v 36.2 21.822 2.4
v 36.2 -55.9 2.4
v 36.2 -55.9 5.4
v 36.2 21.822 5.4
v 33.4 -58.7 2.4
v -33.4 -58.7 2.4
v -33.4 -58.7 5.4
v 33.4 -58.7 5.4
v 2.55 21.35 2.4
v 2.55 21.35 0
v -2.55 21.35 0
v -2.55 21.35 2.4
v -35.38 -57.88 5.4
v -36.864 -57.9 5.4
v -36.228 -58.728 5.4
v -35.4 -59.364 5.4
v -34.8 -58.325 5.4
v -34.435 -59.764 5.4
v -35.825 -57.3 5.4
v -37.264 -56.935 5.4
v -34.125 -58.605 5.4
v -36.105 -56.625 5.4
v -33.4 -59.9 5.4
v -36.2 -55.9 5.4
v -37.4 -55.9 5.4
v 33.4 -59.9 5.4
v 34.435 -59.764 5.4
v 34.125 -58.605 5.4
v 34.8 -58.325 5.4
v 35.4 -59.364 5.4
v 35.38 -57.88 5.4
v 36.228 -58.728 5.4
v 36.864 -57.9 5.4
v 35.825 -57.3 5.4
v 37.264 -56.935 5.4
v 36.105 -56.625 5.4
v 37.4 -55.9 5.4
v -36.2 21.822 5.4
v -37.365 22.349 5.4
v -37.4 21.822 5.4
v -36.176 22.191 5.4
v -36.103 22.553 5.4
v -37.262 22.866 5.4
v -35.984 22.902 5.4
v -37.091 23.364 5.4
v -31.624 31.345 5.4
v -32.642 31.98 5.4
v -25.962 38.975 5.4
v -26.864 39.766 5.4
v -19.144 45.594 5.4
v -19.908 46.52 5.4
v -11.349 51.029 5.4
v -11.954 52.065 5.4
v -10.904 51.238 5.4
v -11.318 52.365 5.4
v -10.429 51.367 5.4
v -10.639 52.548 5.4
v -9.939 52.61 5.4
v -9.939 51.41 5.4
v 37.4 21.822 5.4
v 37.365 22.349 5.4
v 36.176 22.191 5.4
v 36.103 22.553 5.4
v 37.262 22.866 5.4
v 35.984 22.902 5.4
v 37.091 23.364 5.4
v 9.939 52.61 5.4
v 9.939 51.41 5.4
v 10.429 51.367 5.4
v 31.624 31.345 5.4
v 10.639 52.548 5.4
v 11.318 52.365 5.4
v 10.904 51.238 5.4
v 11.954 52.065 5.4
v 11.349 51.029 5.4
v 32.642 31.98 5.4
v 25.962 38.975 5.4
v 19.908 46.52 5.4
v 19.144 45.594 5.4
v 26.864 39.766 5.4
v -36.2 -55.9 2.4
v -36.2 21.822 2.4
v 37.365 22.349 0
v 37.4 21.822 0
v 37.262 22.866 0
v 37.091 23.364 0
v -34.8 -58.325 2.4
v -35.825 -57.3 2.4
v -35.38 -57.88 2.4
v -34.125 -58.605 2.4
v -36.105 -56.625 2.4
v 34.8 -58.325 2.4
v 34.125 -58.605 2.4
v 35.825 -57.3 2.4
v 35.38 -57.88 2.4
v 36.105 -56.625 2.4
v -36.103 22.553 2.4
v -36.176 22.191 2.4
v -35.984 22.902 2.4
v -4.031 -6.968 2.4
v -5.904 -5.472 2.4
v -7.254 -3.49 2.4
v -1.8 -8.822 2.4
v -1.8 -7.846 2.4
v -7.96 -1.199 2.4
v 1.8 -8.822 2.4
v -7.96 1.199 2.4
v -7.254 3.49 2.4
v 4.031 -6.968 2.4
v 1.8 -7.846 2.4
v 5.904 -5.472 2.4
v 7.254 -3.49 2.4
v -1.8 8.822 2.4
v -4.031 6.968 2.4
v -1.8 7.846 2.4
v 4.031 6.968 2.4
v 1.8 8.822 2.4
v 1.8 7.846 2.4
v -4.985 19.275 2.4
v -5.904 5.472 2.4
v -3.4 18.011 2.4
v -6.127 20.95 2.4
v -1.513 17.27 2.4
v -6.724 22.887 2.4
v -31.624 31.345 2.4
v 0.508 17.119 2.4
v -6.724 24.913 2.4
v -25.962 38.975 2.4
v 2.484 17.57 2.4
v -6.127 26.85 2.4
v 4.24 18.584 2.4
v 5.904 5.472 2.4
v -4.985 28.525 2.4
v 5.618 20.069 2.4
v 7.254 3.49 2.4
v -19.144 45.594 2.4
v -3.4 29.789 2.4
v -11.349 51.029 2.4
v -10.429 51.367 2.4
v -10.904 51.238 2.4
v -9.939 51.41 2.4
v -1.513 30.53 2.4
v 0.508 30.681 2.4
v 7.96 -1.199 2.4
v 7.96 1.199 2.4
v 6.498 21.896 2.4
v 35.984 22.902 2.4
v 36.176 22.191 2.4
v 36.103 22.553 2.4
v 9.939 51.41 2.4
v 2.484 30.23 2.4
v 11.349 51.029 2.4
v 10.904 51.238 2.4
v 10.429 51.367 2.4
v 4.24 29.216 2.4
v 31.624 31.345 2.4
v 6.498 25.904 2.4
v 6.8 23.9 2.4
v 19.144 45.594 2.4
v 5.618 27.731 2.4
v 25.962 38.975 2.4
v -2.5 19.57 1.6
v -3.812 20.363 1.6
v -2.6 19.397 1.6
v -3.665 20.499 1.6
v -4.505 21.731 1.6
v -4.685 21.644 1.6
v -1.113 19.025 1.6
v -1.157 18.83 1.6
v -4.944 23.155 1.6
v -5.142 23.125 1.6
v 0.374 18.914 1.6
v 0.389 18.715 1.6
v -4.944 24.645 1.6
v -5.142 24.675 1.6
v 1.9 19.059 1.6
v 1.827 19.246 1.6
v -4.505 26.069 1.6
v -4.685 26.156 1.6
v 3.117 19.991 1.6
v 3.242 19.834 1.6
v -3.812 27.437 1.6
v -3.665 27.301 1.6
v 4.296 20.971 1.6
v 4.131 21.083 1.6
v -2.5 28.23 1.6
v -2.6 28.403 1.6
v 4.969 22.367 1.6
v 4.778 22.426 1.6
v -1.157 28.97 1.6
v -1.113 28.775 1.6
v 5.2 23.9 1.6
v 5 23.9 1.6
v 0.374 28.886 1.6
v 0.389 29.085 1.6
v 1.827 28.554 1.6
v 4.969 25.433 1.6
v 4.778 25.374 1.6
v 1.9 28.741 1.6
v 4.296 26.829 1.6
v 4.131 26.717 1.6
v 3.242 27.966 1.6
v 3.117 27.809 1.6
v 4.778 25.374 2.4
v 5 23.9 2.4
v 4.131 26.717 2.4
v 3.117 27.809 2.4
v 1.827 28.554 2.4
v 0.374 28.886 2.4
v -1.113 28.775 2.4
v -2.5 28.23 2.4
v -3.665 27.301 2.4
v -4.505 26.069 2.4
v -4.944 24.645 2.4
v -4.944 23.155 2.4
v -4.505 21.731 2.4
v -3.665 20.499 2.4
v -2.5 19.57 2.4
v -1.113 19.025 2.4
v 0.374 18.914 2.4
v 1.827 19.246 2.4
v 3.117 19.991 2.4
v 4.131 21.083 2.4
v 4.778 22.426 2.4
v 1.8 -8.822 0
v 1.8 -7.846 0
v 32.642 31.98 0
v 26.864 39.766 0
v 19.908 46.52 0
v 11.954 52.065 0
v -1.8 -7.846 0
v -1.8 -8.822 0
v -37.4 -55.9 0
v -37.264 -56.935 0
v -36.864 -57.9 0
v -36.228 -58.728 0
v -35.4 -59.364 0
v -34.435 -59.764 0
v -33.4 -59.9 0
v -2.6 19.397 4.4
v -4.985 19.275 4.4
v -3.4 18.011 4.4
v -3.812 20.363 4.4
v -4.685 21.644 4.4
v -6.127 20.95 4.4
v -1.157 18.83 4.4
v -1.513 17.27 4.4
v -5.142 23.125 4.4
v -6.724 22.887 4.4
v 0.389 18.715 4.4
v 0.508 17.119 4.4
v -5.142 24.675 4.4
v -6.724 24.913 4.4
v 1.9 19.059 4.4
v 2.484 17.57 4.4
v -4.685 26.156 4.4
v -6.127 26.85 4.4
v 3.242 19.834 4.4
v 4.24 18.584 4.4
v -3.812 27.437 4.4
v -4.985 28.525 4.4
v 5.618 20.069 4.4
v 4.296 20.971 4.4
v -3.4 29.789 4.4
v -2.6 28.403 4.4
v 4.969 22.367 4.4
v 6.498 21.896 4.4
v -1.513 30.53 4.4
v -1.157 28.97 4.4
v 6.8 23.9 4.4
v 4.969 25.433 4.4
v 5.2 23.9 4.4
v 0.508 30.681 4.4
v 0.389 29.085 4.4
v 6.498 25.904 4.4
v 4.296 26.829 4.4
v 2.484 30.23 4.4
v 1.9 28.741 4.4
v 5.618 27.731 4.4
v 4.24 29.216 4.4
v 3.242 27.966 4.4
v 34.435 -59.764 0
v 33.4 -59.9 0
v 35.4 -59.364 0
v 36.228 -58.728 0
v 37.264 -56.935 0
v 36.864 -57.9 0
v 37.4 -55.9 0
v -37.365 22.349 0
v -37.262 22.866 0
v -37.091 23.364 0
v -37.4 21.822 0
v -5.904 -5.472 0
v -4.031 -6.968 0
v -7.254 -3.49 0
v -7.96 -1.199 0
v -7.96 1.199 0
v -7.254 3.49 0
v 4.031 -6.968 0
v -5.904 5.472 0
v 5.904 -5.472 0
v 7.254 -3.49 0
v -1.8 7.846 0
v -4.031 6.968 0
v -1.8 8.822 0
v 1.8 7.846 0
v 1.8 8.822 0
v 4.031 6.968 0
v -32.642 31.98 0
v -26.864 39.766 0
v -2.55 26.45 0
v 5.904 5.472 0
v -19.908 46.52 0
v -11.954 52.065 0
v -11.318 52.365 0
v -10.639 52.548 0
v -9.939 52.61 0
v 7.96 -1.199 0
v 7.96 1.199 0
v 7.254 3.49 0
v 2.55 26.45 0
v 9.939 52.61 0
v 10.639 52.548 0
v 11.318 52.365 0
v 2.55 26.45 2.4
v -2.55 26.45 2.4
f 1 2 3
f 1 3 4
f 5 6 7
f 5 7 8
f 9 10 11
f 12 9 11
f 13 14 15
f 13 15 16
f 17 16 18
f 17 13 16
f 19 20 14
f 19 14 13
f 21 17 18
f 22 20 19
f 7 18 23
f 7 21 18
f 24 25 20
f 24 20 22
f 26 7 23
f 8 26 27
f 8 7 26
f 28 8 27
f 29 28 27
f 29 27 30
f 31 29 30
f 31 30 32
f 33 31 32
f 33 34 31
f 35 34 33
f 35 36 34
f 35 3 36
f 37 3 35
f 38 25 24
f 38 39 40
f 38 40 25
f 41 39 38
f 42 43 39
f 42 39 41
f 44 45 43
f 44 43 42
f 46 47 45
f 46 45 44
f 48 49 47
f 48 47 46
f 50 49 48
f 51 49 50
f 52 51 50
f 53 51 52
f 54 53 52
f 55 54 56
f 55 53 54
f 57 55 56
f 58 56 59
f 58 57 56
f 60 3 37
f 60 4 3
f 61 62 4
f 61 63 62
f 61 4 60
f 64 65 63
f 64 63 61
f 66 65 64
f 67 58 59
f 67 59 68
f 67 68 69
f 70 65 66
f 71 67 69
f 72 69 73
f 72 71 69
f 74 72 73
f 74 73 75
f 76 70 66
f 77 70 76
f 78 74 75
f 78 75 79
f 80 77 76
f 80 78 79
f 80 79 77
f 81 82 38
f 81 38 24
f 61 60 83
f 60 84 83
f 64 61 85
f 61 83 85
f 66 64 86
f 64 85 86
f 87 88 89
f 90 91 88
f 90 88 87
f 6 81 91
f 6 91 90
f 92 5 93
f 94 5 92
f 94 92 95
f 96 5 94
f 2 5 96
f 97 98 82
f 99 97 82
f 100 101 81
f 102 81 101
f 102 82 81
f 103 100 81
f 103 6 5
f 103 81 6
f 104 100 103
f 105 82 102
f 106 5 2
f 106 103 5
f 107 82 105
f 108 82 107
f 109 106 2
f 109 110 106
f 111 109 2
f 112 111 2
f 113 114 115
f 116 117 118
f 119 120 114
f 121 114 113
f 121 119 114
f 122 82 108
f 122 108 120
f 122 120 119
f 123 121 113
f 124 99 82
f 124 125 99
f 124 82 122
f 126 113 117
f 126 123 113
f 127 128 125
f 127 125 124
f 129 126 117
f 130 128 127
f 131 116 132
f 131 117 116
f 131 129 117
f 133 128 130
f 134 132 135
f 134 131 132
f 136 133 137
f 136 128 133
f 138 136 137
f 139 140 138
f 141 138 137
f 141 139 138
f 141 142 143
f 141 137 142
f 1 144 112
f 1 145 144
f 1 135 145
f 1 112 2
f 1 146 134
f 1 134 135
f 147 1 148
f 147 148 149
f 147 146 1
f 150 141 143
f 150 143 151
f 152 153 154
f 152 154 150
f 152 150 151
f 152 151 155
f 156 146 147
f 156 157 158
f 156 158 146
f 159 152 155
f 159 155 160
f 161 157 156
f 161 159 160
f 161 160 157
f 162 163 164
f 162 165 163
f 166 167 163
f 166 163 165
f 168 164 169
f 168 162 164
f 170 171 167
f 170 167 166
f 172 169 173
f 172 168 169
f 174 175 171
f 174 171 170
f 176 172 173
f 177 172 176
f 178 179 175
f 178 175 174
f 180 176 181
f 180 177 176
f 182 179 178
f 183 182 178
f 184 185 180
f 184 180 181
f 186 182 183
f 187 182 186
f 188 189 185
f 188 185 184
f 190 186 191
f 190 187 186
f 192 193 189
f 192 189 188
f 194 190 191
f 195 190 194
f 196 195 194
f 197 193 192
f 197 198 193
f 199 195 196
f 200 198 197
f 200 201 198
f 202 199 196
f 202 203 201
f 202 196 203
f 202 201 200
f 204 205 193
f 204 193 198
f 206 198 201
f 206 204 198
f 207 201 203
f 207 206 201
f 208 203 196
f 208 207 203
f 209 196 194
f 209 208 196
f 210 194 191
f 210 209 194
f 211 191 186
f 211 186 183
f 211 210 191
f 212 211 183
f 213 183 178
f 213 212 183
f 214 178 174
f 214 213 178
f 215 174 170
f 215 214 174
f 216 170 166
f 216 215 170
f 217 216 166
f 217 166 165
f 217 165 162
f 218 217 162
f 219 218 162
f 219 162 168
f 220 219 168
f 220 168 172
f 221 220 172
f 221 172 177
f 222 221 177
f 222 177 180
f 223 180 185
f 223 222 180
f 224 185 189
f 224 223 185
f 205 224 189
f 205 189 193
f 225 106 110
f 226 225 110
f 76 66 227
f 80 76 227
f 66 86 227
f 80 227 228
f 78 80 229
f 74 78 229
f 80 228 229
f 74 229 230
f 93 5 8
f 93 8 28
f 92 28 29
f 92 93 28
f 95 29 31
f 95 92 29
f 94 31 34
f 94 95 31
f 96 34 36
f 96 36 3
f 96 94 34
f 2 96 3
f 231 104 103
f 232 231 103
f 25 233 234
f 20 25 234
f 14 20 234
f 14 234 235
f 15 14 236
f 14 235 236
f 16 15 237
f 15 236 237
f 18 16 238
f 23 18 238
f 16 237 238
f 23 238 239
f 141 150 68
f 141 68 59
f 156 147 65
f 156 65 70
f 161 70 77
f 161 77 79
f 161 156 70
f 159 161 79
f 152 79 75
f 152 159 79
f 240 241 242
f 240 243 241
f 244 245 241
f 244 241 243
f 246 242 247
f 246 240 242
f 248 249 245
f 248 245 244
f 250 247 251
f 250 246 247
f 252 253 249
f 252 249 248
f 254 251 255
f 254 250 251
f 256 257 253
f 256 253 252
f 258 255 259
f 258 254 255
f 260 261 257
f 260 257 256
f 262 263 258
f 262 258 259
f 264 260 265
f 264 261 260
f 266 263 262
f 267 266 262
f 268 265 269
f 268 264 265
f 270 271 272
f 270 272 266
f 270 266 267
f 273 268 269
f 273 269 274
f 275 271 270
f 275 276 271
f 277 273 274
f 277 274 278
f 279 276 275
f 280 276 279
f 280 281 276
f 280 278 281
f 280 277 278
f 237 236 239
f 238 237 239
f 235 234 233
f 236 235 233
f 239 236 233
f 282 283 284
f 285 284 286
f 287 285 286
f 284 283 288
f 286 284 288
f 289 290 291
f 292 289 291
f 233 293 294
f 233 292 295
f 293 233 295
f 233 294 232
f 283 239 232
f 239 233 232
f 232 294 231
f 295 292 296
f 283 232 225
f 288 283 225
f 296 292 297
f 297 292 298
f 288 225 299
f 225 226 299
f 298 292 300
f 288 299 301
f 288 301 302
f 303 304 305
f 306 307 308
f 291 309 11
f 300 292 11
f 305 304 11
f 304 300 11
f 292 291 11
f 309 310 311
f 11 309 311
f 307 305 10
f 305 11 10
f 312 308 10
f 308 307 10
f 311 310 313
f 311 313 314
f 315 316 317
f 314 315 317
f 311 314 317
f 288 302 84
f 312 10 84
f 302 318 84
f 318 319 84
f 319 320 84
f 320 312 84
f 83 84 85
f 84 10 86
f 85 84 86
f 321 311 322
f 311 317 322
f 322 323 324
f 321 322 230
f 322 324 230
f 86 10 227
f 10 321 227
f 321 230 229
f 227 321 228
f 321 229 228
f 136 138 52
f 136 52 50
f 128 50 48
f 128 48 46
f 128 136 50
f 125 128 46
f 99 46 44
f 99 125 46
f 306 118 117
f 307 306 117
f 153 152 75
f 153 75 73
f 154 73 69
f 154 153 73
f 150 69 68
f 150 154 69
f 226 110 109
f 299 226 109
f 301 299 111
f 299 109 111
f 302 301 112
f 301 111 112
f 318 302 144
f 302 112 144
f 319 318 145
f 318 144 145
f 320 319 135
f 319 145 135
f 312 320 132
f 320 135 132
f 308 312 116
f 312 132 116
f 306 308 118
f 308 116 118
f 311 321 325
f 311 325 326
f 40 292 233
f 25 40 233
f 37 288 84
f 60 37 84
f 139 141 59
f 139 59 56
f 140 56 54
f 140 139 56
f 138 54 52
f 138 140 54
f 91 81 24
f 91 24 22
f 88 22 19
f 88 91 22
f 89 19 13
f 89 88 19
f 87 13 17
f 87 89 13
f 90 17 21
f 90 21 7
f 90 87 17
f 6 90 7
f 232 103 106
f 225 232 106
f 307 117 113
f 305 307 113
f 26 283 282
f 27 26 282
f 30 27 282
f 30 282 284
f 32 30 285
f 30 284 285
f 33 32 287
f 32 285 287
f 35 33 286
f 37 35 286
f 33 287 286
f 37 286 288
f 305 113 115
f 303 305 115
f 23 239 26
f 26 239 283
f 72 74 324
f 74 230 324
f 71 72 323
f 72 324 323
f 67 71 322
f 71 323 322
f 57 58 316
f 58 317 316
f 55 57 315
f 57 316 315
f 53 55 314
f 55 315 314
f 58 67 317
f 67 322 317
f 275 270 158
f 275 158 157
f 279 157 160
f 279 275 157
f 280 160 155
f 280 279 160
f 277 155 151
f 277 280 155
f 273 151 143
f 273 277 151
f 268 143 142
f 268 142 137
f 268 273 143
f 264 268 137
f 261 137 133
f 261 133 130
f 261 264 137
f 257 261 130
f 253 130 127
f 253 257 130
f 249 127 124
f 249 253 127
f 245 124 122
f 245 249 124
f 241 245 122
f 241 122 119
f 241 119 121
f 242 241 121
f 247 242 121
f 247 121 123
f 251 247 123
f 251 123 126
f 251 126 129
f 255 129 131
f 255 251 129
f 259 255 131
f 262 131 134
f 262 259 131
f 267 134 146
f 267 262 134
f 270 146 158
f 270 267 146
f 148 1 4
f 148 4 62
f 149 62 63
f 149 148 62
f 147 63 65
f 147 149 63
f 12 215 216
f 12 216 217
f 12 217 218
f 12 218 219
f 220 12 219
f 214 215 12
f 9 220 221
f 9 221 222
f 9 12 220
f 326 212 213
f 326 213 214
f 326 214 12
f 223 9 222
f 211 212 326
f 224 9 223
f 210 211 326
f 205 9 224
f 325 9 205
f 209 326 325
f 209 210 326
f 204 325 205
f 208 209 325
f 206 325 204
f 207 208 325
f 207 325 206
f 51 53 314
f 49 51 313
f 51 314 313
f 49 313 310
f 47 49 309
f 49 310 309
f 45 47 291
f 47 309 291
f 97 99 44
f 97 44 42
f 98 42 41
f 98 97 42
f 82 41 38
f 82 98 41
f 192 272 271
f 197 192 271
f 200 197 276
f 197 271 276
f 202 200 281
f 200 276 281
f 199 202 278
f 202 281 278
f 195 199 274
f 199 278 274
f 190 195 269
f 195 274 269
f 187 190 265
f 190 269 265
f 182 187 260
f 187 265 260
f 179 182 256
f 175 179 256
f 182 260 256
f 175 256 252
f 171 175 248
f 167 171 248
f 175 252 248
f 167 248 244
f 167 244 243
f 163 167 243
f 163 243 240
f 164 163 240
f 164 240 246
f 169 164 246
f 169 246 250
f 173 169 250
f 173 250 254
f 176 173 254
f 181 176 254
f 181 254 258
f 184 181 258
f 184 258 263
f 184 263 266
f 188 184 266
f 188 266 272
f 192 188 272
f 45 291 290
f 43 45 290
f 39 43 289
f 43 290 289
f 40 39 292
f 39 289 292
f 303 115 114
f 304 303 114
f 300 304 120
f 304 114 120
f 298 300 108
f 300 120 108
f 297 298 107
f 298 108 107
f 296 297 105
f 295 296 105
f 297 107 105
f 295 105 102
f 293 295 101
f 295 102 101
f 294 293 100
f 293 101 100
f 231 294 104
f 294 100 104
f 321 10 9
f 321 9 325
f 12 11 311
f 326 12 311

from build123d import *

# Parameters (mm, degrees)
BOSS_EXTRUDE1_DEPTH = 2.4
EXTRUDE_THIN1_DEPTH = 3
SKETCH3_R           = 8.05
CUT_EXTRUDE1_DEPTH  = 71.680761173
SKETCH4_R           = 5.2
SKETCH4_R_2         = 5
CUT_EXTRUDE2_DEPTH  = 0.8
SKETCH5_W           = 5.1
SKETCH5_H           = 5.1
SKETCH5_W_2         = 4.8
SKETCH5_H_2         = 4.8
CUT_EXTRUDE5_DEPTH  = 71.823230652
BOSS_EXTRUDE2_START = 2
SKETCH8_R           = 6.8
SKETCH8_R_2         = 5.2
BOSS_EXTRUDE2_DEPTH = 2


with BuildPart() as part:
    # Sketch1 → Boss-Extrude1 (new body)
    with BuildSketch(Plane.XY):
        with BuildLine():
            Line((37.4, -55.9), (37.4, 21.822390499))
            ThreePointArc((37.4, 21.822390499), (37.321949444, 22.608719027), (37.090843722, 23.364360867))
            ThreePointArc((37.090843722, 23.364360867), (26.864407476, 39.766080063), (11.953879914, 52.065371047))
            ThreePointArc((11.953879914, 52.065371047), (10.982508971, 52.471443007), (9.938833779, 52.61))
            Line((9.938833779, 52.61), (-9.938833779, 52.61))
            ThreePointArc((-9.938833779, 52.61), (-10.982508971, 52.471443007), (-11.953879914, 52.065371047))
            ThreePointArc((-11.953879914, 52.065371047), (-26.864407476, 39.766080063), (-37.090843722, 23.364360867))
            ThreePointArc((-37.090843722, 23.364360867), (-37.321949444, 22.608719027), (-37.4, 21.822390499))
            Line((-37.4, 21.822390499), (-37.4, -55.9))
            ThreePointArc((-37.4, -55.9), (-36.228427125, -58.728427125), (-33.4, -59.9))
            Line((-33.4, -59.9), (33.4, -59.9))
            ThreePointArc((33.4, -59.9), (36.228427125, -58.728427125), (37.4, -55.9))
        make_face()
    extrude(amount=BOSS_EXTRUDE1_DEPTH)

    # Sketch2 → Extrude-Thin1 (add)
    with BuildSketch(Plane.XY.offset(2.4)):
        with BuildLine():
            Line((37.4, -55.9), (37.4, 21.822390499))
            ThreePointArc((37.4, 21.822390499), (37.321949444, 22.608719027), (37.090843722, 23.364360867))
            ThreePointArc((37.090843722, 23.364360867), (26.864407476, 39.766080063), (11.953879914, 52.065371047))
            ThreePointArc((11.953879914, 52.065371047), (10.982508971, 52.471443007), (9.938833779, 52.61))
            Line((9.938833779, 52.61), (-9.938833779, 52.61))
            ThreePointArc((-9.938833779, 52.61), (-10.982508971, 52.471443007), (-11.953879914, 52.065371047))
            ThreePointArc((-11.953879914, 52.065371047), (-26.864407476, 39.766080063), (-37.090843722, 23.364360867))
            ThreePointArc((-37.090843722, 23.364360867), (-37.321949444, 22.608719027), (-37.4, 21.822390499))
            Line((-37.4, 21.822390499), (-37.4, -55.9))
            ThreePointArc((-37.4, -55.9), (-36.228427125, -58.728427125), (-33.4, -59.9))
            Line((-33.4, -59.9), (33.4, -59.9))
            ThreePointArc((33.4, -59.9), (36.228427125, -58.728427125), (37.4, -55.9))
        make_face()
        with BuildLine():
            Line((36.2, -55.9), (36.2, 21.822390499))
            ThreePointArc((36.2, 21.822390499), (36.145364611, 22.372820469), (35.983590606, 22.901769756))
            ThreePointArc((35.983590606, 22.901769756), (25.961683084, 38.975454569), (11.349366074, 51.028759733))
            ThreePointArc((11.349366074, 51.028759733), (10.669406413, 51.313010105), (9.938833779, 51.41))
            Line((9.938833779, 51.41), (-9.938833779, 51.41))
            ThreePointArc((-9.938833779, 51.41), (-10.669406413, 51.313010105), (-11.349366074, 51.028759733))
            ThreePointArc((-11.349366074, 51.028759733), (-25.961683084, 38.975454569), (-35.983590606, 22.901769756))
            ThreePointArc((-35.983590606, 22.901769756), (-36.145364611, 22.372820469), (-36.2, 21.822390499))
            Line((-36.2, 21.822390499), (-36.2, -55.9))
            ThreePointArc((-36.2, -55.9), (-35.379898987, -57.879898987), (-33.4, -58.7))
            Line((-33.4, -58.7), (33.4, -58.7))
            ThreePointArc((33.4, -58.7), (35.379898987, -57.879898987), (36.2, -55.9))
        make_face(mode=Mode.SUBTRACT)
    extrude(amount=EXTRUDE_THIN1_DEPTH)

    # Sketch3 → Cut-Extrude1 (cut, through all)
    with BuildSketch(Plane.XY.offset(2.4)):
        with BuildLine():
            Line((1.8, 8.8223931), (-1.8, 8.8223931))
            Line((-1.8, 8.8223931), (-1.8, 7.846177413))
            ThreePointArc((-1.8, 7.846177413), (0, 8.05), (1.8, 7.846177413))
            Line((1.8, 7.846177413), (1.8, 8.8223931))
        make_face()
        with BuildLine():
            ThreePointArc((1.8, -7.846177413), (0, -8.05), (-1.8, -7.846177413))
            Line((-1.8, -7.846177413), (-1.8, -8.8223931))
            Line((-1.8, -8.8223931), (1.8, -8.8223931))
            Line((1.8, -8.8223931), (1.8, -7.846177413))
        make_face()
        Circle(SKETCH3_R)
    extrude(amount=-CUT_EXTRUDE1_DEPTH, mode=Mode.SUBTRACT)

    # Sketch4 → Cut-Extrude2 (cut)
    with BuildSketch(Plane.XY.offset(2.4)):
        with Locations((0, 23.9)):
            Circle(SKETCH4_R)
        with Locations((0, 23.9)):
            Circle(SKETCH4_R_2, mode=Mode.SUBTRACT)
    extrude(amount=-CUT_EXTRUDE2_DEPTH, mode=Mode.SUBTRACT)

    # Sketch5 → Cut-Extrude5 (cut, through all)
    # profile 1 of 2: a face of its own
    with BuildSketch(Plane(origin=(0, 0, 0), x_dir=(-1, 0, 0), z_dir=(0, 0, -1))):
        with Locations((0, 23.9)):
            Rectangle(SKETCH5_W, SKETCH5_H)
        with Locations((0, 23.9)):
            Rectangle(SKETCH5_W_2, SKETCH5_H_2, mode=Mode.SUBTRACT)
    # profile 2 of 2: a face of its own
    with BuildSketch(Plane(origin=(0, 0, 0), x_dir=(-1, 0, 0), z_dir=(0, 0, -1))):
        with Locations((0, 23.9)):
            Rectangle(SKETCH5_W_2, SKETCH5_H_2)
    extrude(amount=-CUT_EXTRUDE5_DEPTH, mode=Mode.SUBTRACT)

    # Sketch8 → Boss-Extrude2 (add)
    with BuildSketch(Plane.XY.offset(2.4).offset(BOSS_EXTRUDE2_START)):
        with Locations((0, 23.9)):
            Circle(SKETCH8_R)
        with Locations((0, 23.9)):
            Circle(SKETCH8_R_2, mode=Mode.SUBTRACT)
    extrude(amount=-BOSS_EXTRUDE2_DEPTH)


solid = part.part
